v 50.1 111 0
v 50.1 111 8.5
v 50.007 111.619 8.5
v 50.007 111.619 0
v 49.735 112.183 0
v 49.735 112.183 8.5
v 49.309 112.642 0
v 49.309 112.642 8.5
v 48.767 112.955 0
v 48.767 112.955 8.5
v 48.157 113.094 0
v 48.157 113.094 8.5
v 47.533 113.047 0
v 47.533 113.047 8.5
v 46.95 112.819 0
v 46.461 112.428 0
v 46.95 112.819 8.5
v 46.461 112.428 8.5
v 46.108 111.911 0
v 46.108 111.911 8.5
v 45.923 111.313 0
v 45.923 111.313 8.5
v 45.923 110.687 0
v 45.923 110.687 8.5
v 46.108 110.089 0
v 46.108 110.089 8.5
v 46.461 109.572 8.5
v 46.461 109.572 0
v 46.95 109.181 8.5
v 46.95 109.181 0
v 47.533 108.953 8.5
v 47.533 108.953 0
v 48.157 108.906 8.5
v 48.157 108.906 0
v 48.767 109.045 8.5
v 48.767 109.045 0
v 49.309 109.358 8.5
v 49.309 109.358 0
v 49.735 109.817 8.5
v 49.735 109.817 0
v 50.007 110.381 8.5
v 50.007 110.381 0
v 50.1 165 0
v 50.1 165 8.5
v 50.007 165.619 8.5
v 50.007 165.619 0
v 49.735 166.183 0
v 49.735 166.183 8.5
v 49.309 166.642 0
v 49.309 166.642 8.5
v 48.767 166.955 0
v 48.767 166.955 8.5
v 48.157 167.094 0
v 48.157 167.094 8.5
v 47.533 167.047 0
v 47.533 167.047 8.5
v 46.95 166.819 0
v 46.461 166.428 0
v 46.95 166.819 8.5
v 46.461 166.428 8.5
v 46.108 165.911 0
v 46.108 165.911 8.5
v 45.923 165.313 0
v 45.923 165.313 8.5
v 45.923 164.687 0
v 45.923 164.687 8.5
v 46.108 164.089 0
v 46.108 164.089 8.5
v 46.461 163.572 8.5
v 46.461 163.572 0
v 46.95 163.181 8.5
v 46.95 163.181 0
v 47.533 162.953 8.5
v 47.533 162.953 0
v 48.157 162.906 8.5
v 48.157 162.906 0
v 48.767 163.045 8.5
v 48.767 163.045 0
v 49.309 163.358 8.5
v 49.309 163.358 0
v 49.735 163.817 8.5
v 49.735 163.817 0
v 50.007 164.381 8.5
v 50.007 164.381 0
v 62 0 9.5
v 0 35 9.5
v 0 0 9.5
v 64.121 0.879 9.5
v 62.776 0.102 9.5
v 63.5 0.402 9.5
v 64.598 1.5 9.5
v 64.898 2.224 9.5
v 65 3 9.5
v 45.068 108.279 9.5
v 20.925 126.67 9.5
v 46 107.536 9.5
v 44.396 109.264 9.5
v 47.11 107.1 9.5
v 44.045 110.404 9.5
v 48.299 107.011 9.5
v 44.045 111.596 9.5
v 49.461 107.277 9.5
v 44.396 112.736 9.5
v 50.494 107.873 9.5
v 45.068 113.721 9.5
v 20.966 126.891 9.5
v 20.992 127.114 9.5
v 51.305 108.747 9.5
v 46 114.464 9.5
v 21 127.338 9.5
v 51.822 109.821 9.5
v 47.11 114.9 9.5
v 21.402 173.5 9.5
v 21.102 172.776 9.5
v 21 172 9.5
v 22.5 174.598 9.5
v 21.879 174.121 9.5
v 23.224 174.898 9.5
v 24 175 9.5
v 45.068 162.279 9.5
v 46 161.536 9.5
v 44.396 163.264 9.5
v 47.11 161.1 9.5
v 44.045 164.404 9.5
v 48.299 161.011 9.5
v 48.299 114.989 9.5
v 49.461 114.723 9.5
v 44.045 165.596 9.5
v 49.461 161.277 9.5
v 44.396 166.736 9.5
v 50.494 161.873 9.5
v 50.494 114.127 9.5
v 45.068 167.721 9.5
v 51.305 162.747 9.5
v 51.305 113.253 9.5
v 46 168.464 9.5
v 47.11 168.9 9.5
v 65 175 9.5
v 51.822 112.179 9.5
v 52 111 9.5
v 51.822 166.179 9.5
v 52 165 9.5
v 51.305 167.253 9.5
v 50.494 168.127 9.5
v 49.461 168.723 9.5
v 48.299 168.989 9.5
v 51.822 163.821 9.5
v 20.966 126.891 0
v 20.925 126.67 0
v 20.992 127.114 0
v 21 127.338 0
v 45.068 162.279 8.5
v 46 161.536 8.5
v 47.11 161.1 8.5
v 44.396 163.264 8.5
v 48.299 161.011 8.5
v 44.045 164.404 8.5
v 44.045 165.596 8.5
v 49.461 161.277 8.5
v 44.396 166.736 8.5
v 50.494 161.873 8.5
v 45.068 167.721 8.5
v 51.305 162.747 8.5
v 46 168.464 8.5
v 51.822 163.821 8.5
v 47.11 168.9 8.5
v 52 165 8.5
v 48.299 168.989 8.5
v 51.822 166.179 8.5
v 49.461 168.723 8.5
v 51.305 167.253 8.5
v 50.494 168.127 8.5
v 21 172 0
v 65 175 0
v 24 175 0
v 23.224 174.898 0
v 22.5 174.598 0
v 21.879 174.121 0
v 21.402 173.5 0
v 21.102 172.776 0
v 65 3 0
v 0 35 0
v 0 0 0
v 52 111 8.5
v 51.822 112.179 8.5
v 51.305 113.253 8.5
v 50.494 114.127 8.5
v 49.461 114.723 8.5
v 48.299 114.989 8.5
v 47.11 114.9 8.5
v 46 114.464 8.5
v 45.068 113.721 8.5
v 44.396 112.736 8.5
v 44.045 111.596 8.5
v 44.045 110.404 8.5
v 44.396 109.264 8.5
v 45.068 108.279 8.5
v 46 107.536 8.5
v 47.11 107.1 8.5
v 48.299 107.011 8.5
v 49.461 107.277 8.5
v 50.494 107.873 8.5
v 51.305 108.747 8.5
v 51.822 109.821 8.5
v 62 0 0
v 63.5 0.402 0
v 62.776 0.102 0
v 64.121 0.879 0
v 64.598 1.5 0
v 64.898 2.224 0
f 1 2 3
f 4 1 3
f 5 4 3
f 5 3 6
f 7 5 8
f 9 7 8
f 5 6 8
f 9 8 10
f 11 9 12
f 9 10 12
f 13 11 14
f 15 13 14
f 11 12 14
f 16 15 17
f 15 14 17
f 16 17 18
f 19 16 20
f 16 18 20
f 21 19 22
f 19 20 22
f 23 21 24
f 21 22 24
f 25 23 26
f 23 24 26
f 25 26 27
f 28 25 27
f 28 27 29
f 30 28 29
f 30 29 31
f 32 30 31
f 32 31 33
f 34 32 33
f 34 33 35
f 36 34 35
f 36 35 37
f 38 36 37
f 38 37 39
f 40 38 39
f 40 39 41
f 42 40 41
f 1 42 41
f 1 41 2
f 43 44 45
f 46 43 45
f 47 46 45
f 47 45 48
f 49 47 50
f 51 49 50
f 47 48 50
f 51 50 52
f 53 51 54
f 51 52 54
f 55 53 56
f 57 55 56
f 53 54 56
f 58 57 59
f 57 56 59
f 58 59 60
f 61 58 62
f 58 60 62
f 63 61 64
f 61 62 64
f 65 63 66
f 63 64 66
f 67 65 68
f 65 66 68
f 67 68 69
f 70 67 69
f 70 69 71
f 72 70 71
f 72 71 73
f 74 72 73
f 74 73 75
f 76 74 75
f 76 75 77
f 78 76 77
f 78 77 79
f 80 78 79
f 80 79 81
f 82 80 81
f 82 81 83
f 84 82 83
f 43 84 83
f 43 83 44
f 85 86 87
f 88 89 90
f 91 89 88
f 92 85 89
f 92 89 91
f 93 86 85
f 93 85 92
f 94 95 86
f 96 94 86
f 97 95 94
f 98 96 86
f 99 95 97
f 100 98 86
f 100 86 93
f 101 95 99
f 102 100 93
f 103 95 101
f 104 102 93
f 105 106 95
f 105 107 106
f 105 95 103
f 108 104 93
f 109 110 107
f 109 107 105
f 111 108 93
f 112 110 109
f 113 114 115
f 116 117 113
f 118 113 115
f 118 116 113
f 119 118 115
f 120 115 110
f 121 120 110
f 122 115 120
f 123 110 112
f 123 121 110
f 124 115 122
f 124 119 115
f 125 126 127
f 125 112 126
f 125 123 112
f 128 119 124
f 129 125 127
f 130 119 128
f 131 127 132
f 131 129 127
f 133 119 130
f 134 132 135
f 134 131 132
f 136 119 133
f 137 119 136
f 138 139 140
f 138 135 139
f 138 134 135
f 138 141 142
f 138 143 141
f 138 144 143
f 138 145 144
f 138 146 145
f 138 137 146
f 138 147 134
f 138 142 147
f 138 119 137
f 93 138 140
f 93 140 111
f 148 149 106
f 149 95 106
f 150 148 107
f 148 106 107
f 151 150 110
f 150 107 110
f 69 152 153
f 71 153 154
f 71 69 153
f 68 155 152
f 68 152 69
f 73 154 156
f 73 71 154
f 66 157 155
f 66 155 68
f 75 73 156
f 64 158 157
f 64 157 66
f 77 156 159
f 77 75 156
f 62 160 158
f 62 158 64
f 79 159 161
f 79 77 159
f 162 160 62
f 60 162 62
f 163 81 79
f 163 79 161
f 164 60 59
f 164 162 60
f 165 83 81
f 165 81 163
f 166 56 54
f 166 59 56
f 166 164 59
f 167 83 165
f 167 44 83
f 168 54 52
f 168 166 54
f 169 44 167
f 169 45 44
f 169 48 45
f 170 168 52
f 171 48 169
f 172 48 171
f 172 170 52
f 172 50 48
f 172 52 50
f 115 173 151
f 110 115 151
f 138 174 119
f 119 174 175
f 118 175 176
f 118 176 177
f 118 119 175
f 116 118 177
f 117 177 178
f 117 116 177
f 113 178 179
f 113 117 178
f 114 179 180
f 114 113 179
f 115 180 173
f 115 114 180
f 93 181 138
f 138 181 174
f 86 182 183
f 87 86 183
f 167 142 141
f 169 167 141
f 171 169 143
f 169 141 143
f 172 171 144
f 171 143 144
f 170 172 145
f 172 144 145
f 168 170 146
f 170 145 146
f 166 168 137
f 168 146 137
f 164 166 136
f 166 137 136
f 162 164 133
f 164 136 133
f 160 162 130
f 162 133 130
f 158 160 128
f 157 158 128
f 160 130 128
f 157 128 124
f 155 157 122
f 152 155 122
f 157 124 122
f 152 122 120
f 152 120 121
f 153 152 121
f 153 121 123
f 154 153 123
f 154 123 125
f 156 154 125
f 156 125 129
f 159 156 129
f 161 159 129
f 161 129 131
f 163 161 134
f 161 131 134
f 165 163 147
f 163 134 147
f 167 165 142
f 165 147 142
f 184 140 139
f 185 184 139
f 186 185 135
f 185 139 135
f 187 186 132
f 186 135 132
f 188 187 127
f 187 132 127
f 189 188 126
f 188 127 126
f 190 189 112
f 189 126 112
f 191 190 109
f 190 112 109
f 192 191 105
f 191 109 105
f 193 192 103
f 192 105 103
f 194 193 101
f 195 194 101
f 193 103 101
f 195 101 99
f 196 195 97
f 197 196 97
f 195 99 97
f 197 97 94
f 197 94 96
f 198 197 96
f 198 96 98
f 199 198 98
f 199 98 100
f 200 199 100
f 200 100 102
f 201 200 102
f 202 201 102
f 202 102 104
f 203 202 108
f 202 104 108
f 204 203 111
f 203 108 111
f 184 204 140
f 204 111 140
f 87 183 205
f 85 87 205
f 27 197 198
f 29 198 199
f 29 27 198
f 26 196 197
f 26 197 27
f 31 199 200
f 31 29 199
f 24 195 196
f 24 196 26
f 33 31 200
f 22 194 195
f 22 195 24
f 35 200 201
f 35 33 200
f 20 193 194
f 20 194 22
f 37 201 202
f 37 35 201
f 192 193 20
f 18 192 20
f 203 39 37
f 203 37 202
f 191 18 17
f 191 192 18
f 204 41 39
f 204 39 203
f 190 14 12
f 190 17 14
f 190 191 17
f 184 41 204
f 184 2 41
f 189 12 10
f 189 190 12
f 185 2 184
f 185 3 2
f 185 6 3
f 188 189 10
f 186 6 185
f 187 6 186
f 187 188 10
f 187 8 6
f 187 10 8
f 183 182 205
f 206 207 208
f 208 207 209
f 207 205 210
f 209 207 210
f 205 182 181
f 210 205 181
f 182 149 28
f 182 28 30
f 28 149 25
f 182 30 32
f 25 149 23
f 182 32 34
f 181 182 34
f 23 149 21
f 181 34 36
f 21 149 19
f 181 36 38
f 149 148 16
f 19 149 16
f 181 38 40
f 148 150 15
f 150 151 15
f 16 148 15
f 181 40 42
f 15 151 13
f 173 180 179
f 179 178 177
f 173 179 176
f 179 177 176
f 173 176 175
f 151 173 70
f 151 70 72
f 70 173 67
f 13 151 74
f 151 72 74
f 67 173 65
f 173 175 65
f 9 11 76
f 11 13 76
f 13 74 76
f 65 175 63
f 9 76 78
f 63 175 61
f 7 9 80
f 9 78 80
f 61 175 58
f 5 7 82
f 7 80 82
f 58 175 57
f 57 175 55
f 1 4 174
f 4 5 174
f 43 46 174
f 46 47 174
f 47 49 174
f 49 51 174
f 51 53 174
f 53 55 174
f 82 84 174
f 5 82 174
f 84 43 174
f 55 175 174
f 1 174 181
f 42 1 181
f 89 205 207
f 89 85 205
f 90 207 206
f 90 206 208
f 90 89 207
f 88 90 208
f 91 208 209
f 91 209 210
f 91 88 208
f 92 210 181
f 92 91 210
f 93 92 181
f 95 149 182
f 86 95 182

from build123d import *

# Parameters (mm, degrees)
EXTRUDE_4_DEPTH     = 9.5
SKETCH_11_R         = 2.1
CUT_EXTRUDE_8_DEPTH = 187.923112536
SKETCH_12_R         = 4
CUT_EXTRUDE_9_DEPTH = 1
FILLET_7_R          = 3


with BuildPart() as part:
    # 草图10 → 凸台-拉伸4 (new body)
    with BuildSketch(Plane.XY):
        Polygon((0, 0), (65, 0), (65, 175), (21, 175), (21, 127), (0, 35), align=None)
    extrude(amount=EXTRUDE_4_DEPTH)

    # 草图11 → 切除-拉伸8 (cut, through all)
    with BuildSketch(Plane.XY.offset(9.5)):
        with Locations((48, 165)):
            Circle(SKETCH_11_R)
        with Locations((48, 111)):
            Circle(SKETCH_11_R)
    extrude(amount=-CUT_EXTRUDE_8_DEPTH, mode=Mode.SUBTRACT)

    # 草图12 → 切除-拉伸9 (cut)
    with BuildSketch(Plane.XY.offset(9.5)):
        with Locations((48, 165)):
            Circle(SKETCH_12_R)
        with Locations((48, 111)):
            Circle(SKETCH_12_R)
    extrude(amount=-CUT_EXTRUDE_9_DEPTH, mode=Mode.SUBTRACT)

    # 圆角7
    fillet_7_edges = [part.edges().sort_by_distance(p)[0] for p in [
        (21, 175, 4.75),
        (65, 0, 4.75),
        (21, 127, 4.75),
    ]]
    fillet(fillet_7_edges, radius=FILLET_7_R)


solid = part.part
